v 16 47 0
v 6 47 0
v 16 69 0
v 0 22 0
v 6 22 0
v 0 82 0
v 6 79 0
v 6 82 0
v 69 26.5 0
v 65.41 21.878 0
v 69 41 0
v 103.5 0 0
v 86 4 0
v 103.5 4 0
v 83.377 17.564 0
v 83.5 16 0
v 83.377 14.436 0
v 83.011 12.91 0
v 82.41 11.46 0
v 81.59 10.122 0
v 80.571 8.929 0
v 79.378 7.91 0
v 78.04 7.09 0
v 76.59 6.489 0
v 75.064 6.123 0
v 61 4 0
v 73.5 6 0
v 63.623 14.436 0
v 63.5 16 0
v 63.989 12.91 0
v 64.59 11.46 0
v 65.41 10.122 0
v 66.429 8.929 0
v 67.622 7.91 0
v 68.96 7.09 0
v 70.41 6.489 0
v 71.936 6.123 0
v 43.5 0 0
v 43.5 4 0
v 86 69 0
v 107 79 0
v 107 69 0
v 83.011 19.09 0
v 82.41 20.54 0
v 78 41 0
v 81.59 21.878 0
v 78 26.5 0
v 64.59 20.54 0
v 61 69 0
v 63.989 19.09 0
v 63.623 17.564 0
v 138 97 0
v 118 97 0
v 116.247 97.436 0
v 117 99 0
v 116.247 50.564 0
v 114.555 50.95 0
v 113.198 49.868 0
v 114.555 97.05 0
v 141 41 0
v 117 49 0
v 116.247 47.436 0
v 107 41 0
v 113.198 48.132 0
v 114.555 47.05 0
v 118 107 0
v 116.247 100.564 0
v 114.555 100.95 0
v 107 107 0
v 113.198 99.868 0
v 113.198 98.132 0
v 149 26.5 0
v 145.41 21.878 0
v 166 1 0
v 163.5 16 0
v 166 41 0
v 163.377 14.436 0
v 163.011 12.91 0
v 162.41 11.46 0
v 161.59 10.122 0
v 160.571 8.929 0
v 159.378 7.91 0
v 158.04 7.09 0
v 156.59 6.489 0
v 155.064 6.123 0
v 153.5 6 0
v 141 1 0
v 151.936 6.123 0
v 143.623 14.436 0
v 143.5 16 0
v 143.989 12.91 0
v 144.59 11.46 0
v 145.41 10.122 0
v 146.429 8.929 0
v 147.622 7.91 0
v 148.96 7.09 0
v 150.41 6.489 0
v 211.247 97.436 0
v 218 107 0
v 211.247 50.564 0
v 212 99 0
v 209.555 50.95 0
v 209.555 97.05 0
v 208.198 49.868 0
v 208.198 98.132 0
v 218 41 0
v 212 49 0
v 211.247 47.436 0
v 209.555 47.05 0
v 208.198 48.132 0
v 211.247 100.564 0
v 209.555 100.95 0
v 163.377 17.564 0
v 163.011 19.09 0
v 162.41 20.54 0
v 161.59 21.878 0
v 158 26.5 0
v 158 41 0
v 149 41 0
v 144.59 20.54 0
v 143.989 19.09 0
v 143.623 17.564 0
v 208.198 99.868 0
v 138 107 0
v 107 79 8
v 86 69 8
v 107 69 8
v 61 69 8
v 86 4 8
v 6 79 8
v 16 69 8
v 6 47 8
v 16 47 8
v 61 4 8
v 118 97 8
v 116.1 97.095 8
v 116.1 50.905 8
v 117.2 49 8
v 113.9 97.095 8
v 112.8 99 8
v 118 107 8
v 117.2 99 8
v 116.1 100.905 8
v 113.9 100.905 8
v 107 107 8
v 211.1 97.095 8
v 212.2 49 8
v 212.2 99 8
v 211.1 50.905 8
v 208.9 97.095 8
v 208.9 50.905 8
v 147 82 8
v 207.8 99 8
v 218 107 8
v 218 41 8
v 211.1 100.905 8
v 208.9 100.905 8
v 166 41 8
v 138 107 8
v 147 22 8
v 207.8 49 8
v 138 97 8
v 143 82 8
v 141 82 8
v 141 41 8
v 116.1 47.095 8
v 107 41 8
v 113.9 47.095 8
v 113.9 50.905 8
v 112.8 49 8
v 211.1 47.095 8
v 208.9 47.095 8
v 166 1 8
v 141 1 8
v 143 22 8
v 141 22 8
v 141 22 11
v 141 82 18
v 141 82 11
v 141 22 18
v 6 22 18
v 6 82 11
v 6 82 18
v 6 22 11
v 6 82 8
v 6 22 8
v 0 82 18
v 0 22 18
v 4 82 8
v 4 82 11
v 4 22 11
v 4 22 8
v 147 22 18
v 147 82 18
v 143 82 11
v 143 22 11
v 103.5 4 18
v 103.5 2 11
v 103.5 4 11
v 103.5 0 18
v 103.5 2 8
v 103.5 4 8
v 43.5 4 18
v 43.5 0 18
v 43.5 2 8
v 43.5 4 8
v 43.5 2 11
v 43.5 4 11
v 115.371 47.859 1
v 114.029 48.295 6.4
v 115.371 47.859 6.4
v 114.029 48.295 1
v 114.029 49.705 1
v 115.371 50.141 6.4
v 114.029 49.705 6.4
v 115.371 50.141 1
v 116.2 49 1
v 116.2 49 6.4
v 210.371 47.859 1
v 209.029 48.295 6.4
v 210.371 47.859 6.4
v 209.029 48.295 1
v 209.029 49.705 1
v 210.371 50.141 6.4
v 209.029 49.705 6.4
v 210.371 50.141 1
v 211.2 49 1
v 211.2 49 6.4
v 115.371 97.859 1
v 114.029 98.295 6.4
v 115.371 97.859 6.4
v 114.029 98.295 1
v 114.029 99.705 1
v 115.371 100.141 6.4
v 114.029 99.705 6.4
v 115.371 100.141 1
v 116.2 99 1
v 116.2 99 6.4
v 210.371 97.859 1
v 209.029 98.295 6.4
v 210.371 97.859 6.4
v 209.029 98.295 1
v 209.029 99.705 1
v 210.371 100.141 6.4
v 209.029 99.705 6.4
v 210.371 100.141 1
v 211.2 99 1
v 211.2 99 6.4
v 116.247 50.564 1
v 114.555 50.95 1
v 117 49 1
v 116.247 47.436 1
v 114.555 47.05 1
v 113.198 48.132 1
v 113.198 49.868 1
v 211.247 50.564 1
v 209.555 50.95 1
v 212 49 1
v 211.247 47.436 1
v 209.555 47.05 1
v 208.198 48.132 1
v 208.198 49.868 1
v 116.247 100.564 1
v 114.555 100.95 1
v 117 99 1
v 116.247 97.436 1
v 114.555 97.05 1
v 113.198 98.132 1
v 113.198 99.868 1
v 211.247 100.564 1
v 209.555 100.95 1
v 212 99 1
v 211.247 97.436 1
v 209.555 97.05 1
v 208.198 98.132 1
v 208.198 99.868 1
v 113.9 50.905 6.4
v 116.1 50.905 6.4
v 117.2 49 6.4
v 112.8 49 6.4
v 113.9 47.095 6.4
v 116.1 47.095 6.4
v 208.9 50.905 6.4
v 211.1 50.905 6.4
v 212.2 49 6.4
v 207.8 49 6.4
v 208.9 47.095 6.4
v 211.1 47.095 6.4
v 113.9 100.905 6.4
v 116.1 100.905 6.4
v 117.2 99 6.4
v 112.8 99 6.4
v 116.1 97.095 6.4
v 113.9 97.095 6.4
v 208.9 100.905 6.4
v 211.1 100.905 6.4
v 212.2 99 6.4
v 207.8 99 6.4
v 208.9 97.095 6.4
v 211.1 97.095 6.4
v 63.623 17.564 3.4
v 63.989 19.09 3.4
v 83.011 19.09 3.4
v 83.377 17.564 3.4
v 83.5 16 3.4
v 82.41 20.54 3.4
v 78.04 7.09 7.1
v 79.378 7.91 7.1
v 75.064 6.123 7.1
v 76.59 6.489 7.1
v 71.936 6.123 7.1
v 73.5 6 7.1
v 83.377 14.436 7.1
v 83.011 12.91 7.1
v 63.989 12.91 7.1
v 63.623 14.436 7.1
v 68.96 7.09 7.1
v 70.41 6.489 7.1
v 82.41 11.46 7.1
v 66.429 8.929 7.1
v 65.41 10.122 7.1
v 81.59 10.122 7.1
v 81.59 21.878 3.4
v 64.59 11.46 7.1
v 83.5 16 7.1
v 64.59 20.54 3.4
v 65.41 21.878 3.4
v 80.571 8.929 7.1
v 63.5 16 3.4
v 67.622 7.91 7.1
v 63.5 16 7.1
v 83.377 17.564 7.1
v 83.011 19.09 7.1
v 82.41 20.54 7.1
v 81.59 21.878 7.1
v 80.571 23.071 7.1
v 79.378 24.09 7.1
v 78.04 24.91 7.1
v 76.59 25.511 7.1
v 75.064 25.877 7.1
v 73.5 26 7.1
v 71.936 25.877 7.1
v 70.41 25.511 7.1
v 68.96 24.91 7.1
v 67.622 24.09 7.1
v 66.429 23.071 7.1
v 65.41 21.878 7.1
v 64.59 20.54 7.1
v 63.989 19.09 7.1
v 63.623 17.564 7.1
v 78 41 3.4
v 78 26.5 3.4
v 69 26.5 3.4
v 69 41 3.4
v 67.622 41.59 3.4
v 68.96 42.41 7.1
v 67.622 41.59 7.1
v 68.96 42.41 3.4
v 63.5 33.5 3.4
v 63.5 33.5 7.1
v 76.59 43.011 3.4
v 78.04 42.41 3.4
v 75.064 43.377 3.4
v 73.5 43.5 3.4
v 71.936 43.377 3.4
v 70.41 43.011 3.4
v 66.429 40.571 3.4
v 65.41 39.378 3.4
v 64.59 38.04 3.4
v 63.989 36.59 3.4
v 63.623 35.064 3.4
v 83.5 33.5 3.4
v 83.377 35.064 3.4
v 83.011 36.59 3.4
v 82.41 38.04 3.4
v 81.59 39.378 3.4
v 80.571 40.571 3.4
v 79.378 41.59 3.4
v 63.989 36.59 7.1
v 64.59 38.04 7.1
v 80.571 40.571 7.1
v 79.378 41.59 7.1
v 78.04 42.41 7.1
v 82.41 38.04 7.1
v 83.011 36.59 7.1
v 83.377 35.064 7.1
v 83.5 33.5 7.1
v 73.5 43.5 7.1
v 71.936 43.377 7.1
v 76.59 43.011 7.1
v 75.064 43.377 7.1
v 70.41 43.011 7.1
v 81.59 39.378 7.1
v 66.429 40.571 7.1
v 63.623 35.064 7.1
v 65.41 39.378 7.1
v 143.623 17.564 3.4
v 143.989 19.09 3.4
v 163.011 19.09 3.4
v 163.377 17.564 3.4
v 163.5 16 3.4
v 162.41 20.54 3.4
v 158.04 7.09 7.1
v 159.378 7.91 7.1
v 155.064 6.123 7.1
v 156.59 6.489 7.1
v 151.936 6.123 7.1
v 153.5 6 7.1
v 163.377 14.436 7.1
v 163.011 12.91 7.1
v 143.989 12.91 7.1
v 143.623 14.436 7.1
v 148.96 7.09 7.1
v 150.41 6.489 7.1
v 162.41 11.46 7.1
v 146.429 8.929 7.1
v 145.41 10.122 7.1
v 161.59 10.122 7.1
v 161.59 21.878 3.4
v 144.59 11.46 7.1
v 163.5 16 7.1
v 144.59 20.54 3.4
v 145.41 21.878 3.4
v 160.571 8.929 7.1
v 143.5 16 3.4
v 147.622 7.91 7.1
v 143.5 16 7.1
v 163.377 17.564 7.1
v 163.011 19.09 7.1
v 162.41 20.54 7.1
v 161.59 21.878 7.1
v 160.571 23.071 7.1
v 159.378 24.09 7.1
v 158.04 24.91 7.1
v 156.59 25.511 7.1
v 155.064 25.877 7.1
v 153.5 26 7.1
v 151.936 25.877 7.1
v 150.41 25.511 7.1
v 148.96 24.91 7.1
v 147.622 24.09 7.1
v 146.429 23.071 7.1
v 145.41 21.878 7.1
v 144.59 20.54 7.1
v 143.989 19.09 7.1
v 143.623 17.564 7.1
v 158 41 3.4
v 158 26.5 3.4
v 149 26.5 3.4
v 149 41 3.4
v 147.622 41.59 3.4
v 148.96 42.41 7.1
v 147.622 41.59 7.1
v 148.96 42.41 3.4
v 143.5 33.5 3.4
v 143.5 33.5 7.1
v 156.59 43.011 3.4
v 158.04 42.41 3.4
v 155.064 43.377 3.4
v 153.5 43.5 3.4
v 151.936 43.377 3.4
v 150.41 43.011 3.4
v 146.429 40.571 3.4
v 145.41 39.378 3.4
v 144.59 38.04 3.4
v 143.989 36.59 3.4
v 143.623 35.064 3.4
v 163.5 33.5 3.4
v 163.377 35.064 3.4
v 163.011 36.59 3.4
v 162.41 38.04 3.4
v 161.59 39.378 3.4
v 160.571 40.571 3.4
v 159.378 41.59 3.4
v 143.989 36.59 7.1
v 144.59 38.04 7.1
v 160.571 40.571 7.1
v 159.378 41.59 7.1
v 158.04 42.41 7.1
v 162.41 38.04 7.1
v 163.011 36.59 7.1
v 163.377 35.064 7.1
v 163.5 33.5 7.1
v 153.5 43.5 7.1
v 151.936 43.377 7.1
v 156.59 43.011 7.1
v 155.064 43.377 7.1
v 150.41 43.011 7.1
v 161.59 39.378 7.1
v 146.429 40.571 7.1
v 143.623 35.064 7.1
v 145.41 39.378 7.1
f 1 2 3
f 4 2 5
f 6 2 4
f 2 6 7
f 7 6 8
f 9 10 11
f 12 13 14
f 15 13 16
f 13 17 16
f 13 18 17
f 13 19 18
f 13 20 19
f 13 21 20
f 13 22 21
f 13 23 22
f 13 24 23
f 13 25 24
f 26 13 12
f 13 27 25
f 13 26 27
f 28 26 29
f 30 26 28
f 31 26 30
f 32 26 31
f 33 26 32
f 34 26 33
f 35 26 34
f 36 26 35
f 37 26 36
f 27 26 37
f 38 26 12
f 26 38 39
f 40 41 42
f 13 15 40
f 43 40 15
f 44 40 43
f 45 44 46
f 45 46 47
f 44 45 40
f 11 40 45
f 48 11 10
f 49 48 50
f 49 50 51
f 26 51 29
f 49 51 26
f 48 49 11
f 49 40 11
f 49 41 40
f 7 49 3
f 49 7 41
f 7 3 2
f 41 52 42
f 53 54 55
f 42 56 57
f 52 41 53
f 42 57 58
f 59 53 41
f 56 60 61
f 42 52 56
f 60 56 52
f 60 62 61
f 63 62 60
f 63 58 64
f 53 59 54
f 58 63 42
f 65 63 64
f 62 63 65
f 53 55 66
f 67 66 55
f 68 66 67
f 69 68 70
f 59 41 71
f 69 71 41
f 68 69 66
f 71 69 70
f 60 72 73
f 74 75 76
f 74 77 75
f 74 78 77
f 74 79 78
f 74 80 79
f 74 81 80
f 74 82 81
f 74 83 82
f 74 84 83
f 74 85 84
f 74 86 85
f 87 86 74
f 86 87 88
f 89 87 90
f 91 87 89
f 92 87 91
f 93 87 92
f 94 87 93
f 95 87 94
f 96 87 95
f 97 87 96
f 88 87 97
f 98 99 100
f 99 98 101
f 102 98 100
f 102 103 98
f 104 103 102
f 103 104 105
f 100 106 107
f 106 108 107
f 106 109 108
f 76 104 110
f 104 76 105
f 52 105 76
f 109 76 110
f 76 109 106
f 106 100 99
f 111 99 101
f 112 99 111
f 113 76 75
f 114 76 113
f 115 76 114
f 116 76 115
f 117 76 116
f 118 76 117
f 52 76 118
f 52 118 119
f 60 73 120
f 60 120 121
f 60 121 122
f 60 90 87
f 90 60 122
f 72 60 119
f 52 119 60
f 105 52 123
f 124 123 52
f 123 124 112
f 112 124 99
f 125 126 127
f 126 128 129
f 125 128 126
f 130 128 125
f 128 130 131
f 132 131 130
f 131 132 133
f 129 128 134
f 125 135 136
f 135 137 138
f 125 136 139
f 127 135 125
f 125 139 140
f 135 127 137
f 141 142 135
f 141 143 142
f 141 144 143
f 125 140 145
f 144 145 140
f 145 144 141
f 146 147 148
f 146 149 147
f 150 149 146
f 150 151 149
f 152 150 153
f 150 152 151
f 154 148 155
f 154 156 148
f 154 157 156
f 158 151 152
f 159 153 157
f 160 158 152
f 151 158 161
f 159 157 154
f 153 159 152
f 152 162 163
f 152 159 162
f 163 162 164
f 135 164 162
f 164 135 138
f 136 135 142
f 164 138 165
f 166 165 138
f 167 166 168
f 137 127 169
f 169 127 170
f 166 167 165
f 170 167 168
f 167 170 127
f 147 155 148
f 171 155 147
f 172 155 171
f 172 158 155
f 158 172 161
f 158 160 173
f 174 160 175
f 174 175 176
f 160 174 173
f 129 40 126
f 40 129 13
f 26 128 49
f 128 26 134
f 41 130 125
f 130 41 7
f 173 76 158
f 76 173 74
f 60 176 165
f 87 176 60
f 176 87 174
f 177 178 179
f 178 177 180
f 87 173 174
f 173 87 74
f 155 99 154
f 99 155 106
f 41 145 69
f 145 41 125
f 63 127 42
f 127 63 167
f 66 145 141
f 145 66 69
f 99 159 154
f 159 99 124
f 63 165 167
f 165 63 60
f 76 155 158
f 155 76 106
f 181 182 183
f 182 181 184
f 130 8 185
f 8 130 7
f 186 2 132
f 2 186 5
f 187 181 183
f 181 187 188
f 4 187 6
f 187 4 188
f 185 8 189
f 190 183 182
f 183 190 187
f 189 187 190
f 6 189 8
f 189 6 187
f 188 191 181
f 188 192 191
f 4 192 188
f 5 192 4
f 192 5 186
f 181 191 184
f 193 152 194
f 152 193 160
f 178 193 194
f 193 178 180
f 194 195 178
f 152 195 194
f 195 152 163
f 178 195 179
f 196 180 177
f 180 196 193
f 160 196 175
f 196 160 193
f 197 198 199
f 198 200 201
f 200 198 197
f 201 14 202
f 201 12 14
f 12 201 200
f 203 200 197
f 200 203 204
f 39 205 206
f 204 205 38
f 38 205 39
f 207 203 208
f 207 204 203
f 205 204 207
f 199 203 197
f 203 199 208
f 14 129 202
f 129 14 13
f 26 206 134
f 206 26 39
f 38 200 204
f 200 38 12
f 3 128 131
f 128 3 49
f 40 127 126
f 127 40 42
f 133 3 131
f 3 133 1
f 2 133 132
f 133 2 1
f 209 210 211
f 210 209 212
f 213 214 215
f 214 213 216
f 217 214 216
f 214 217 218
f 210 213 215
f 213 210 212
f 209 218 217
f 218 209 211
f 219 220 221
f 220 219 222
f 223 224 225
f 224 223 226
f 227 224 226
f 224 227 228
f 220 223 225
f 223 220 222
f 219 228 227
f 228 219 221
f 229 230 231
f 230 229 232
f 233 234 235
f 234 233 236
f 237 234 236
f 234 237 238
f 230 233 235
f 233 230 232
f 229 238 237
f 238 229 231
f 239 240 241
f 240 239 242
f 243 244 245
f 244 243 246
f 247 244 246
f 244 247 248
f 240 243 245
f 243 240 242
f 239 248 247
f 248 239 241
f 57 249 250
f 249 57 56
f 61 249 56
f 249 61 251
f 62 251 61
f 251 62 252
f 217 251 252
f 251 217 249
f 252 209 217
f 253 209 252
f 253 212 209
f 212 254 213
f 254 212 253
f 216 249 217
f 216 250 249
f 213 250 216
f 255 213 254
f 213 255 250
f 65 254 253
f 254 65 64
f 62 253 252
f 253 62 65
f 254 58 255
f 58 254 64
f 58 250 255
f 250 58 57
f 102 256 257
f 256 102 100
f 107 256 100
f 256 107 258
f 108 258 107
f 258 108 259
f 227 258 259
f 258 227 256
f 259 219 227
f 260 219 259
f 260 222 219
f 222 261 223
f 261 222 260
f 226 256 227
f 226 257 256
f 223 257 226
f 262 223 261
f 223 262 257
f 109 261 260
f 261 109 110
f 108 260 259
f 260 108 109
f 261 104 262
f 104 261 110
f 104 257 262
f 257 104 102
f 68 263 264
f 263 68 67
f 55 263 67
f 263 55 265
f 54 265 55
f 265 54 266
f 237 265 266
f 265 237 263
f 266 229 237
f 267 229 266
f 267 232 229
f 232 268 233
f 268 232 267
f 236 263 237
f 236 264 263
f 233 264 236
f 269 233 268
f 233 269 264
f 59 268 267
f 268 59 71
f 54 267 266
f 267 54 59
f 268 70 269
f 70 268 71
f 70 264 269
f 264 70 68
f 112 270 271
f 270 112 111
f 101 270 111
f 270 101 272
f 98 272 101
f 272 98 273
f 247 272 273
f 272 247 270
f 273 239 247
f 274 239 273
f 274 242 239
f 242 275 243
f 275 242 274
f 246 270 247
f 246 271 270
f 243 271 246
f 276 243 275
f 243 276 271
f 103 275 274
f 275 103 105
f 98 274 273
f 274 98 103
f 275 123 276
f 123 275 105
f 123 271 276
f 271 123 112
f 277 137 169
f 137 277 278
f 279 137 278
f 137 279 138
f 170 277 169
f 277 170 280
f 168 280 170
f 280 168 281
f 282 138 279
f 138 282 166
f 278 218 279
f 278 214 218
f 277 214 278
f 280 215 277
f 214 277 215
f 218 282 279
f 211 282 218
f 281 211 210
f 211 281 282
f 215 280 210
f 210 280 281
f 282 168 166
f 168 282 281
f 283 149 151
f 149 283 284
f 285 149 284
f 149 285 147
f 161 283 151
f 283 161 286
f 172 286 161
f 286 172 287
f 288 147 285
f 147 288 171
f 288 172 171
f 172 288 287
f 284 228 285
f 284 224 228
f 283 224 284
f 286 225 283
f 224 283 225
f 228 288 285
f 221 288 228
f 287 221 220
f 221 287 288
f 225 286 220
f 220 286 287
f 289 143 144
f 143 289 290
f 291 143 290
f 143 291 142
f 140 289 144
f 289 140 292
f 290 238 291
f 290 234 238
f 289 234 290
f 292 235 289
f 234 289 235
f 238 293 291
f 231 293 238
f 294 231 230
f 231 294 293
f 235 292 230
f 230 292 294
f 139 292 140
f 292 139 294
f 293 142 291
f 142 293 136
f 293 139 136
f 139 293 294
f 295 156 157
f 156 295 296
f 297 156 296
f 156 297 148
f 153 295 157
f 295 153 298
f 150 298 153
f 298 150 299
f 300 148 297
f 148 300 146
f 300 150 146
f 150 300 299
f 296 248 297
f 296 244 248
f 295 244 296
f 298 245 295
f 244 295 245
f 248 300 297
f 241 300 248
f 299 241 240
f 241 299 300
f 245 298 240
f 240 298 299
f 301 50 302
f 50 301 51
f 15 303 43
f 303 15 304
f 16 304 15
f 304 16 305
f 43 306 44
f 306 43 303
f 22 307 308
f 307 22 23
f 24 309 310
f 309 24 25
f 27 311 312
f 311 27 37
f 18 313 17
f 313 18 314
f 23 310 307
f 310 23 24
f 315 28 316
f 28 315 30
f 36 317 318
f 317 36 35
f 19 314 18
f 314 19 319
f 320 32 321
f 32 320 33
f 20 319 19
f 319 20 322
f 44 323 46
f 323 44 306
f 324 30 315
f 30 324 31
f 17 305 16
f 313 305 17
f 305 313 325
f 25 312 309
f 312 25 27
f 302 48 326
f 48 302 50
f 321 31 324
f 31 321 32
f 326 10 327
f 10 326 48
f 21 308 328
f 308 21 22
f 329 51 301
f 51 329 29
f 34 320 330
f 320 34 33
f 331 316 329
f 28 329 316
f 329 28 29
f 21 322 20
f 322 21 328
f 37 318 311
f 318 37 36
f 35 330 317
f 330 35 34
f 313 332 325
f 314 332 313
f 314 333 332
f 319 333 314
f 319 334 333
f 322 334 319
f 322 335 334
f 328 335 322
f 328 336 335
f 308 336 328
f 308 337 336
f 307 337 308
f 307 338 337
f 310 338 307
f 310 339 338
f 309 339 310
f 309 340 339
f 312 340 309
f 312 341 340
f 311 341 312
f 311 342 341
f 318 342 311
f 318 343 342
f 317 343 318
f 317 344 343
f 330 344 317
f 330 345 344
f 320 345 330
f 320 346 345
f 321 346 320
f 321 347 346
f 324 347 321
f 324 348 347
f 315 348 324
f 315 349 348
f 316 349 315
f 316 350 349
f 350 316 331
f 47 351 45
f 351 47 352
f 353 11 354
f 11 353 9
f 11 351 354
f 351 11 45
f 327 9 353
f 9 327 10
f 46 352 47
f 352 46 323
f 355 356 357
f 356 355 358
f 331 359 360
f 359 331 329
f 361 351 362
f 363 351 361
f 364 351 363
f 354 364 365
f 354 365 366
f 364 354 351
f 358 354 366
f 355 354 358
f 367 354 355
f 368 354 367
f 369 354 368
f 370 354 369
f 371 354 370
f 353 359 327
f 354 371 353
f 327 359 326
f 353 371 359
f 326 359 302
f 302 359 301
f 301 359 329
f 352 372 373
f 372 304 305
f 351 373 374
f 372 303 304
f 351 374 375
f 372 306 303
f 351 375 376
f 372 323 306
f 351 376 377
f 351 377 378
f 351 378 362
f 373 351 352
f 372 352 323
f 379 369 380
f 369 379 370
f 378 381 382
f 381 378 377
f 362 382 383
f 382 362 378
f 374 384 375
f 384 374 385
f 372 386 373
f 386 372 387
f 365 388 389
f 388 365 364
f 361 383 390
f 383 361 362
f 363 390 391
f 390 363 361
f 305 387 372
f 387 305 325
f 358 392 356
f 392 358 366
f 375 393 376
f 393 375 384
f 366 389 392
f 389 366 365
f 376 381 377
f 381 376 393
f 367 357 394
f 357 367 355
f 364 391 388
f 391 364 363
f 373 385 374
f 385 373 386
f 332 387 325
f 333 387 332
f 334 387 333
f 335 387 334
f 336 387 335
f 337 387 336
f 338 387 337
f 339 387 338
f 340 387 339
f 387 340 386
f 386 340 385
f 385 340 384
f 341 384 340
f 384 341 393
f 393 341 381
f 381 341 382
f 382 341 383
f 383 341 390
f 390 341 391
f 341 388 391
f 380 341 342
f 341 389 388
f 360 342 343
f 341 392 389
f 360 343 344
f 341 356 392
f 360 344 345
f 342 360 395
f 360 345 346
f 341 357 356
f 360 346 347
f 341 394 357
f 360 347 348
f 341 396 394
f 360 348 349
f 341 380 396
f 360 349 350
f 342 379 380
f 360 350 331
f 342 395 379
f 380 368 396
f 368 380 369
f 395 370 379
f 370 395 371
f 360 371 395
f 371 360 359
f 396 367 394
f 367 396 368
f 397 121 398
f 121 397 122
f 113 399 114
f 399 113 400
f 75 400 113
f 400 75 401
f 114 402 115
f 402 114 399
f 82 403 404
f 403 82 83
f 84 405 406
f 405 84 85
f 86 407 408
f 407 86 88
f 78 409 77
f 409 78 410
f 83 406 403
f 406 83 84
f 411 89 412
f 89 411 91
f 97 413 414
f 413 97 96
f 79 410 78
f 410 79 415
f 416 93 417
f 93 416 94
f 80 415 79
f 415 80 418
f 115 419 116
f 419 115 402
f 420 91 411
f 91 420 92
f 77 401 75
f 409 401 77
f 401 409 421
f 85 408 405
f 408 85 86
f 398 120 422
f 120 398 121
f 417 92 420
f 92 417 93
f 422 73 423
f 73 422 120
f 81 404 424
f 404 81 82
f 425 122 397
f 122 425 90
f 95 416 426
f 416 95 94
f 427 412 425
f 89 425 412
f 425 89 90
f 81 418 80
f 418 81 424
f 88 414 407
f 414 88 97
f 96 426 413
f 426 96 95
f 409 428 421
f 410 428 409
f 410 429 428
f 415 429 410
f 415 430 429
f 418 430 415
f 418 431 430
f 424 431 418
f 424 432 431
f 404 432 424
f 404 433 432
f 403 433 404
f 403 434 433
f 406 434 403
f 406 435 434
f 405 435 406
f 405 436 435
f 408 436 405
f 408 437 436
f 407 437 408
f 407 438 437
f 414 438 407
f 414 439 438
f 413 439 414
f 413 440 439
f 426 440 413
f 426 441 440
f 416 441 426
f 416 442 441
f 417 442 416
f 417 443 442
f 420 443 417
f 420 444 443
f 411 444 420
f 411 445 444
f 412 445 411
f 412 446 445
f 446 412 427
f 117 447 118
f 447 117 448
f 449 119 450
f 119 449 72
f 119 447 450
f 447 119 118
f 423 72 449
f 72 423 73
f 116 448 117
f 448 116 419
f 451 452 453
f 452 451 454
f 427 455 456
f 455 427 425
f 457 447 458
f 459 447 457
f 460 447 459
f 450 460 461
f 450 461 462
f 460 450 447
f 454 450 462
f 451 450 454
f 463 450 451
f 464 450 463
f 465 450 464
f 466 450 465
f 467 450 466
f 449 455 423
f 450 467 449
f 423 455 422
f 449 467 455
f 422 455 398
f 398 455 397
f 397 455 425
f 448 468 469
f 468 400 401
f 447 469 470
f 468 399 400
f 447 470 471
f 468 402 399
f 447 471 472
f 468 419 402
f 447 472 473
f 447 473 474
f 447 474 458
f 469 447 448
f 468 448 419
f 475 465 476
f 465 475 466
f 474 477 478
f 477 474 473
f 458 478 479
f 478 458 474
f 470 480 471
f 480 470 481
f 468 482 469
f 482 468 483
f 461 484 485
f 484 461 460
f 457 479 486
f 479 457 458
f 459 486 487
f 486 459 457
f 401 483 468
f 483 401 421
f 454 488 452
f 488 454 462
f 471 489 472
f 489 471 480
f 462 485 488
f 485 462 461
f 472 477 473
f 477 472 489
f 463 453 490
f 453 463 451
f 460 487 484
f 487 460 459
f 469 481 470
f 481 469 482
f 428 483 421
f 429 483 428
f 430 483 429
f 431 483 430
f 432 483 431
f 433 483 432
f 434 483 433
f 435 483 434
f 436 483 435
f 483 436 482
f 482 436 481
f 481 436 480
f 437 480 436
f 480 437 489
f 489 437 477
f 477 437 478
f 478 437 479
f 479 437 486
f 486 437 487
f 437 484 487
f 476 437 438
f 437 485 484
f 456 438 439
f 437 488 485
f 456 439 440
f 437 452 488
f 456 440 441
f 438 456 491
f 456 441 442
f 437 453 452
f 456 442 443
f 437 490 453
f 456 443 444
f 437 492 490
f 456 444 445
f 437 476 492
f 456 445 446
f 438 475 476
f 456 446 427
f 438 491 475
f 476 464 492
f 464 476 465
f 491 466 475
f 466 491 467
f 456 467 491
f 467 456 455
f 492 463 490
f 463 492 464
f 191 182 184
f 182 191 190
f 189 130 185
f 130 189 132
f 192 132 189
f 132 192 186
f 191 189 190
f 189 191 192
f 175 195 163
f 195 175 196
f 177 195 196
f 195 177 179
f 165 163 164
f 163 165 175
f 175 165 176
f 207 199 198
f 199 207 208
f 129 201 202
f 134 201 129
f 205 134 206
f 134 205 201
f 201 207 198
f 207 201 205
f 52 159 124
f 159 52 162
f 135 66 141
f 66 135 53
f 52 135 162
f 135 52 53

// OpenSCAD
// file: parameters_ed060xc3.scad
// Parameters for ED060XC3 E-ink screen case design
// ED060XC3 specifications: 10cm × 14cm screen with top ribbon

// E-ink screen dimensions (ED060XC3)
eink_width = 135;     // 13.5cm width (reduced by 5mm)
eink_height = 100;    // 10cm height  
eink_thickness = 2;   // Assumed thickness

// Active part dimensions (estimated based on typical margins)
active_offset_x = 8;  // Estimated margin
active_offset_y = 8;  // Estimated margin
active_width = 124;   // Screen width - margins
active_height = 84;   // Screen height - margins

// Ribbon connection (located on top facet, 0.5cm from top-right corner)
ribbon_offset_from_right = 5;  // 0.5cm from right edge
ribbon_offset_from_top = 0;    // On the top edge
ribbon_width = 17;             // Estimated ribbon width
ribbon_height = 20;            // Estimated ribbon height

// PCB dimensions (reuse existing PCB from original design)
pcb_width = 97;
pcb_height = 55;
pcb_thickness = 1.6; // Standard PCB thickness

// Mounting hole positions (relative to PCB origin - reuse from original)
mounting_holes = [
    [27.5, 12],
    [122.5, 12], 
    [27.5, 62],
    [122.5, 62]
];

// Design parameters for e-ink holder
arm_thickness = 6;
arm_length = 10;
groove_depth = 2;
groove_width = eink_thickness + 1.0; // Screen thickness + clearance
wall_height = 1.5;
bottom_arm_thickness = 4;

// Calculate case dimensions to accommodate new screen size
case_width = eink_width + 2 * arm_thickness;   // 135 + 12 = 147mm
case_height = eink_height + bottom_arm_thickness; // 100 + 4 = 104mm

// Back structure parameters for e-ink holder
back_thickness = 2;
center_size = 60;
tendril_width = 10;

// PCB holder parameters
screw_hole_diameter = 2.4; // M2 screws (2mm + clearance)
screw_head_diameter = 4;   // M2 round head diameter  
screw_head_height = 1.4;   // M2 round head height (above surface)
standoff_height = 5;

// M2 nut parameters  
nut_diameter = 4.4;  // M2 hex nut width across flats (4mm + tolerance)
nut_thickness = 1.6; // M2 nut thickness

// Temporary assembly option (while waiting for screws)
use_temporary_pins = false;  // Set to false for screw holes, true for temporary pins
pin_diameter = 2.0;         // Pin diameter (fits through 2.2mm PCB holes)  
pin_height = 3;             // Pin height above standoff

// Calculate PCB holder dimensions to encompass all mounting holes
min_hole_x = min([for (hole = mounting_holes) hole[0]]) - 10;
max_hole_x = max([for (hole = mounting_holes) hole[0]]) + 10;
min_hole_y = min([for (hole = mounting_holes) hole[1]]) - 10;
max_hole_y = max([for (hole = mounting_holes) hole[1]]) + 10;

pcb_holder_width = max_hole_x - min_hole_x;
pcb_holder_height = max_hole_y - min_hole_y;

// Complete case parameters
case_thickness = 8; // Total thickness for back-to-back mounting
// main file
// Complete case for ED060XC3 e-ink screen - back-to-back design
// E-ink screen on front, PCB mounted on back, minimal ribbon travel
// ED060XC3: 10cm × 14cm screen with ribbon on top facet

include <parameters_ed060xc3.scad>

// Keyhole parameters (from keyhole_test.scad with updated thicknesses)
pin_head_diameter = 19;
pin_shaft_diameter = 8;
clearance = 1;
wide_opening = pin_head_diameter + clearance;   // 20mm
narrow_slot = pin_shaft_diameter + clearance;   // 9mm
slot_length = 15;

// Updated layer thicknesses for better tolerance
layer1_thickness = 3.5;  // Top layer with narrow slot + wide opening
layer2_thickness = 3.5;  // Middle layer with full pin head width
layer3_thickness = 2;    // Bottom solid layer (pin stop)
keyhole_total_thickness = layer1_thickness + layer2_thickness + layer3_thickness; // 9mm

module keyhole_mount() {
    // Keyhole opening from the back side (bottom) of the case
    // Note: we cut from the BOTTOM (negative Z), working upward through layers
    
    // Layer 1: Keyhole shape cuts through both Layer 1 and Layer 2 (no ceiling)
    translate([0, 0, -0.1]) {
        // Wide circular opening at bottom
        translate([0, -wide_opening/2 + 5, 0])
            cylinder(h = layer1_thickness + layer2_thickness + 0.2, d = wide_opening, $fn = 40);
        
        // Narrow slot extending upward
        translate([0, slot_length/2 + 5, 0])
            cube([narrow_slot, slot_length, layer1_thickness + layer2_thickness + 0.2], center = true);
        
        // Smooth transition between wide and narrow
        hull() {
            translate([0, -wide_opening/2 + 5, 0])
                cylinder(h = layer1_thickness + layer2_thickness + 0.2, d = wide_opening, $fn = 40);
            translate([0, 5, 0])
                cube([narrow_slot, 1, layer1_thickness + layer2_thickness + 0.2], center = true);
        }
    }
    
    // Layer 2: Full pin head width opening throughout entire keyhole area - MIDDLE layer
    translate([0, 0, layer1_thickness - 0.1]) {
        hull() {
            // Bottom wide opening (matches Layer 1 position)
            translate([0, -wide_opening/2 + 5, 0])
                cylinder(h = layer2_thickness + 0.2, d = wide_opening, $fn = 40);
            // Top of slot area (matches Layer 1 extent)  
            translate([0, slot_length/2 + 5, 0])
                cylinder(h = layer2_thickness + 0.2, d = wide_opening, $fn = 40);
        }
    }
    
    // Layer 3: NO CUTS - solid material remains (pin stop surface) - TOP layer
    // This layer intentionally has no cuts to provide the pin stop surface
}

module complete_case_ed060xc3() {
    // E-ink screen positioning (centered in case)
    screen_offset_x = (case_width - eink_width) / 2;
    screen_offset_y = (case_height - eink_height) / 2;
    
    // PCB positioned back-to-back with screen (positioned for ribbon routing)
    // Since ribbon is on top edge 0.5cm from right, position PCB accordingly
    pcb_offset_x = screen_offset_x + eink_width - ribbon_offset_from_right - pcb_width / 2;
    pcb_offset_y = screen_offset_y + eink_height - pcb_height - 10; // 10mm from top edge
    
    // PCB mounting area bounds (defined once for use throughout)
    pcb_left = pcb_offset_x + min([for (hole = mounting_holes) hole[0]]) - 8;
    pcb_right = pcb_offset_x + max([for (hole = mounting_holes) hole[0]]) + 8;
    pcb_bottom = pcb_offset_y + min([for (hole = mounting_holes) hole[1]]) - 8;
    pcb_top = pcb_offset_y + max([for (hole = mounting_holes) hole[1]]) + 8;
    
    difference() {
        union() {
            // PCB mounting area (unified base structure)
            translate([pcb_left, pcb_bottom, 0])
            cube([pcb_right - pcb_left, pcb_top - pcb_bottom, case_thickness]);
            
            // PCB standoffs integrated into base
            for (hole = mounting_holes) {
                translate([pcb_offset_x + hole[0], pcb_offset_y + hole[1], 0])
                    cylinder(h = case_thickness, d = screw_head_diameter + 2);
            }
            
            // Temporary pins (when enabled) extending below standoffs for bottom PCB attachment
            if (use_temporary_pins) {
                for (hole = mounting_holes) {
                    translate([pcb_offset_x + hole[0], pcb_offset_y + hole[1], -pin_height])
                        cylinder(h = pin_height, d = pin_diameter);
                }
            }
            
            // E-ink discrete mount points (60mm each)
            mount_point_length = 60;
            
            // E-ink mount points positioned to actually support the screen edges
            // Calculate screen bounds for proper arm positioning
            screen_left = screen_offset_x;
            screen_right = screen_offset_x + eink_width;
            screen_bottom = screen_offset_y;
            screen_top = screen_offset_y + eink_height;
            
            // Left mount point - at case edge, centered on screen's left side
            translate([0, screen_offset_y + (eink_height - mount_point_length) / 2, 0])
            cube([arm_thickness, mount_point_length, case_thickness + arm_length]);
            
            // Right mount point - at case edge, centered on screen's right side
            translate([case_width - arm_thickness, screen_offset_y + (eink_height - mount_point_length) / 2, 0])
            cube([arm_thickness, mount_point_length, case_thickness + arm_length]);
            
            // Bottom mount point - at bottom edge, centered on screen's bottom
            translate([screen_offset_x + (eink_width - mount_point_length) / 2, 0, 0])
            cube([mount_point_length, bottom_arm_thickness, case_thickness + arm_length]);
            
            // Unified structural network connecting all arms via PCB hub
            // Create a continuous H-shaped connector that links all arms
            
            // Define connection points
            left_arm_center_y = screen_offset_y + eink_height / 2;
            right_arm_center_y = screen_offset_y + eink_height / 2;
            bottom_arm_center_x = screen_offset_x + eink_width / 2;
            pcb_center_x = (pcb_left + pcb_right) / 2;
            pcb_center_y = (pcb_top + pcb_bottom) / 2;
            
            // Main horizontal spine connecting left to right through PCB area
            translate([0, pcb_center_y - tendril_width/2, 0])
            cube([case_width - arm_thickness, tendril_width, case_thickness]);
            
            // Vertical connection from bottom arm to horizontal spine
            translate([bottom_arm_center_x - tendril_width/2, bottom_arm_thickness, 0])
            cube([tendril_width, pcb_center_y + tendril_width/2 - bottom_arm_thickness, case_thickness]);
            
            // Additional connections to ensure arms connect properly to spine
            // Left arm vertical connector (if needed)
            if (left_arm_center_y != pcb_center_y) {
                translate([0, min(left_arm_center_y, pcb_center_y) - tendril_width/2, 0])
                cube([arm_thickness + tendril_width, abs(left_arm_center_y - pcb_center_y) + tendril_width, case_thickness]);
            }
            
            // Right arm vertical connector (if needed)
            if (right_arm_center_y != pcb_center_y) {
                translate([case_width - arm_thickness - tendril_width, min(right_arm_center_y, pcb_center_y) - tendril_width/2, 0])
                cube([arm_thickness + tendril_width, abs(right_arm_center_y - pcb_center_y) + tendril_width, case_thickness]);
            }
            
            // Ribbon fold guide removed
            
            // Keyhole material extensions (add material around keyhole areas)
            // Position keyholes exactly 120mm apart (3 × 4cm grid spacing) for larger screen
            keyhole_spacing = 120;  // 3 × 4cm multiple
            case_center_x = case_width / 2;  // Center of case
            keyhole_1_x = case_center_x;  // At center
            keyhole_2_x = keyhole_1_x + 80;  // 80mm spacing (2 × 4cm multiple)
            keyhole_y = pcb_bottom - 20; // Below the bottom screw holes line
            keyhole_material_width = 25;  // Normal width for left keyhole
            keyhole_material_height = 50; // Height of keyhole support material (added 1cm)
            
            // Calculate tendril coverage
            tendril_width = 10;
            bottom_arm_thickness = 4;
            tendril_top_y = pcb_center_y + tendril_width/2;
            
            for (keyhole_x = [keyhole_1_x, keyhole_2_x]) {
                // Extend keyhole material to cover the bottom tendril completely
                keyhole_material_top_y = tendril_top_y;
                keyhole_material_bottom_y = keyhole_y - 20; // Keep original bottom
                extended_height = keyhole_material_top_y - keyhole_material_bottom_y;
                
                translate([keyhole_x - keyhole_material_width/2, keyhole_material_bottom_y, 0])
                cube([keyhole_material_width, extended_height, case_thickness]);
            }
            
        }
        
        // E-ink screen grooves at the proper height
        screen_offset_x = (case_width - eink_width) / 2;
        screen_offset_y = (case_height - eink_height) / 2;
        
        // Grooves for discrete mount points (aligned with screen position)
        mount_point_length = 60;
        
        // Left groove - in left mount point (positioned for screen)
        translate([arm_thickness - groove_depth, screen_offset_y + (eink_height - mount_point_length) / 2, 
                  case_thickness])
            cube([groove_depth, mount_point_length, groove_width]);
        
        // Right groove - in right mount point (positioned for screen)
        translate([case_width - arm_thickness, screen_offset_y + (eink_height - mount_point_length) / 2,
                  case_thickness])
            cube([groove_depth, mount_point_length, groove_width]);
        
        // Bottom groove - in bottom mount point (positioned for screen)
        translate([screen_offset_x + (eink_width - mount_point_length) / 2, bottom_arm_thickness - groove_depth,
                  case_thickness])
            cube([mount_point_length, groove_depth, groove_width]);
        
        // PCB mounting: pins or holes based on parameter
        if (use_temporary_pins) {
            // No holes needed - just pins extending upward from standoffs
        } else {
            // PCB mounting holes (screw clearance)
            for (hole = mounting_holes) {
                translate([pcb_offset_x + hole[0], pcb_offset_y + hole[1], -1])
                    cylinder(h = case_thickness + arm_length + 2, d = screw_hole_diameter);
            }
            
            // Round screw head clearance (from bottom)  
            for (hole = mounting_holes) {
                translate([pcb_offset_x + hole[0], pcb_offset_y + hole[1], -screw_head_height])
                    cylinder(h = screw_head_height + 1, d = screw_head_diameter);
            }
            
            // Nut traps (from top of standoffs)
            for (hole = mounting_holes) {
                translate([pcb_offset_x + hole[0], pcb_offset_y + hole[1], case_thickness - nut_thickness])
                    cylinder(h = nut_thickness + 1, d = nut_diameter, $fn=6); // Hexagonal nut trap
            }
        }
        
        // Text removed
        
        // Ribbon cable notch at top of PCB area  
        // Starting 1.1cm from left edge to avoid screw hole interference
        ribbon_notch_start_x = pcb_left + 11;  // 1.1cm from PCB left edge
        ribbon_notch_width = 20;               // 2cm wide
        ribbon_notch_depth = 10;               // 1cm deep into the PCB material
        
        // Create notch by cutting into the PCB mounting area from the top
        translate([ribbon_notch_start_x, pcb_top - ribbon_notch_depth, -1])
        cube([ribbon_notch_width, ribbon_notch_depth, case_thickness + 2]);
        
        // Keyhole mounting holes exactly 120mm apart (3 × 4cm grid spacing)
        keyhole_spacing = 120;  // 3 × 4cm multiple
        case_center_x = case_width / 2;  // Center of case
        keyhole_1_x = case_center_x;  // At center
        keyhole_2_x = keyhole_1_x + 80;  // 80mm spacing (2 × 4cm multiple)
        keyhole_y = pcb_bottom - 20; // Below the bottom screw holes line
        
        for (keyhole_x = [keyhole_1_x, keyhole_2_x]) {
            translate([keyhole_x, keyhole_y, 0]) {
                keyhole_mount();
            }
        }
    }
}

complete_case_ed060xc3();
